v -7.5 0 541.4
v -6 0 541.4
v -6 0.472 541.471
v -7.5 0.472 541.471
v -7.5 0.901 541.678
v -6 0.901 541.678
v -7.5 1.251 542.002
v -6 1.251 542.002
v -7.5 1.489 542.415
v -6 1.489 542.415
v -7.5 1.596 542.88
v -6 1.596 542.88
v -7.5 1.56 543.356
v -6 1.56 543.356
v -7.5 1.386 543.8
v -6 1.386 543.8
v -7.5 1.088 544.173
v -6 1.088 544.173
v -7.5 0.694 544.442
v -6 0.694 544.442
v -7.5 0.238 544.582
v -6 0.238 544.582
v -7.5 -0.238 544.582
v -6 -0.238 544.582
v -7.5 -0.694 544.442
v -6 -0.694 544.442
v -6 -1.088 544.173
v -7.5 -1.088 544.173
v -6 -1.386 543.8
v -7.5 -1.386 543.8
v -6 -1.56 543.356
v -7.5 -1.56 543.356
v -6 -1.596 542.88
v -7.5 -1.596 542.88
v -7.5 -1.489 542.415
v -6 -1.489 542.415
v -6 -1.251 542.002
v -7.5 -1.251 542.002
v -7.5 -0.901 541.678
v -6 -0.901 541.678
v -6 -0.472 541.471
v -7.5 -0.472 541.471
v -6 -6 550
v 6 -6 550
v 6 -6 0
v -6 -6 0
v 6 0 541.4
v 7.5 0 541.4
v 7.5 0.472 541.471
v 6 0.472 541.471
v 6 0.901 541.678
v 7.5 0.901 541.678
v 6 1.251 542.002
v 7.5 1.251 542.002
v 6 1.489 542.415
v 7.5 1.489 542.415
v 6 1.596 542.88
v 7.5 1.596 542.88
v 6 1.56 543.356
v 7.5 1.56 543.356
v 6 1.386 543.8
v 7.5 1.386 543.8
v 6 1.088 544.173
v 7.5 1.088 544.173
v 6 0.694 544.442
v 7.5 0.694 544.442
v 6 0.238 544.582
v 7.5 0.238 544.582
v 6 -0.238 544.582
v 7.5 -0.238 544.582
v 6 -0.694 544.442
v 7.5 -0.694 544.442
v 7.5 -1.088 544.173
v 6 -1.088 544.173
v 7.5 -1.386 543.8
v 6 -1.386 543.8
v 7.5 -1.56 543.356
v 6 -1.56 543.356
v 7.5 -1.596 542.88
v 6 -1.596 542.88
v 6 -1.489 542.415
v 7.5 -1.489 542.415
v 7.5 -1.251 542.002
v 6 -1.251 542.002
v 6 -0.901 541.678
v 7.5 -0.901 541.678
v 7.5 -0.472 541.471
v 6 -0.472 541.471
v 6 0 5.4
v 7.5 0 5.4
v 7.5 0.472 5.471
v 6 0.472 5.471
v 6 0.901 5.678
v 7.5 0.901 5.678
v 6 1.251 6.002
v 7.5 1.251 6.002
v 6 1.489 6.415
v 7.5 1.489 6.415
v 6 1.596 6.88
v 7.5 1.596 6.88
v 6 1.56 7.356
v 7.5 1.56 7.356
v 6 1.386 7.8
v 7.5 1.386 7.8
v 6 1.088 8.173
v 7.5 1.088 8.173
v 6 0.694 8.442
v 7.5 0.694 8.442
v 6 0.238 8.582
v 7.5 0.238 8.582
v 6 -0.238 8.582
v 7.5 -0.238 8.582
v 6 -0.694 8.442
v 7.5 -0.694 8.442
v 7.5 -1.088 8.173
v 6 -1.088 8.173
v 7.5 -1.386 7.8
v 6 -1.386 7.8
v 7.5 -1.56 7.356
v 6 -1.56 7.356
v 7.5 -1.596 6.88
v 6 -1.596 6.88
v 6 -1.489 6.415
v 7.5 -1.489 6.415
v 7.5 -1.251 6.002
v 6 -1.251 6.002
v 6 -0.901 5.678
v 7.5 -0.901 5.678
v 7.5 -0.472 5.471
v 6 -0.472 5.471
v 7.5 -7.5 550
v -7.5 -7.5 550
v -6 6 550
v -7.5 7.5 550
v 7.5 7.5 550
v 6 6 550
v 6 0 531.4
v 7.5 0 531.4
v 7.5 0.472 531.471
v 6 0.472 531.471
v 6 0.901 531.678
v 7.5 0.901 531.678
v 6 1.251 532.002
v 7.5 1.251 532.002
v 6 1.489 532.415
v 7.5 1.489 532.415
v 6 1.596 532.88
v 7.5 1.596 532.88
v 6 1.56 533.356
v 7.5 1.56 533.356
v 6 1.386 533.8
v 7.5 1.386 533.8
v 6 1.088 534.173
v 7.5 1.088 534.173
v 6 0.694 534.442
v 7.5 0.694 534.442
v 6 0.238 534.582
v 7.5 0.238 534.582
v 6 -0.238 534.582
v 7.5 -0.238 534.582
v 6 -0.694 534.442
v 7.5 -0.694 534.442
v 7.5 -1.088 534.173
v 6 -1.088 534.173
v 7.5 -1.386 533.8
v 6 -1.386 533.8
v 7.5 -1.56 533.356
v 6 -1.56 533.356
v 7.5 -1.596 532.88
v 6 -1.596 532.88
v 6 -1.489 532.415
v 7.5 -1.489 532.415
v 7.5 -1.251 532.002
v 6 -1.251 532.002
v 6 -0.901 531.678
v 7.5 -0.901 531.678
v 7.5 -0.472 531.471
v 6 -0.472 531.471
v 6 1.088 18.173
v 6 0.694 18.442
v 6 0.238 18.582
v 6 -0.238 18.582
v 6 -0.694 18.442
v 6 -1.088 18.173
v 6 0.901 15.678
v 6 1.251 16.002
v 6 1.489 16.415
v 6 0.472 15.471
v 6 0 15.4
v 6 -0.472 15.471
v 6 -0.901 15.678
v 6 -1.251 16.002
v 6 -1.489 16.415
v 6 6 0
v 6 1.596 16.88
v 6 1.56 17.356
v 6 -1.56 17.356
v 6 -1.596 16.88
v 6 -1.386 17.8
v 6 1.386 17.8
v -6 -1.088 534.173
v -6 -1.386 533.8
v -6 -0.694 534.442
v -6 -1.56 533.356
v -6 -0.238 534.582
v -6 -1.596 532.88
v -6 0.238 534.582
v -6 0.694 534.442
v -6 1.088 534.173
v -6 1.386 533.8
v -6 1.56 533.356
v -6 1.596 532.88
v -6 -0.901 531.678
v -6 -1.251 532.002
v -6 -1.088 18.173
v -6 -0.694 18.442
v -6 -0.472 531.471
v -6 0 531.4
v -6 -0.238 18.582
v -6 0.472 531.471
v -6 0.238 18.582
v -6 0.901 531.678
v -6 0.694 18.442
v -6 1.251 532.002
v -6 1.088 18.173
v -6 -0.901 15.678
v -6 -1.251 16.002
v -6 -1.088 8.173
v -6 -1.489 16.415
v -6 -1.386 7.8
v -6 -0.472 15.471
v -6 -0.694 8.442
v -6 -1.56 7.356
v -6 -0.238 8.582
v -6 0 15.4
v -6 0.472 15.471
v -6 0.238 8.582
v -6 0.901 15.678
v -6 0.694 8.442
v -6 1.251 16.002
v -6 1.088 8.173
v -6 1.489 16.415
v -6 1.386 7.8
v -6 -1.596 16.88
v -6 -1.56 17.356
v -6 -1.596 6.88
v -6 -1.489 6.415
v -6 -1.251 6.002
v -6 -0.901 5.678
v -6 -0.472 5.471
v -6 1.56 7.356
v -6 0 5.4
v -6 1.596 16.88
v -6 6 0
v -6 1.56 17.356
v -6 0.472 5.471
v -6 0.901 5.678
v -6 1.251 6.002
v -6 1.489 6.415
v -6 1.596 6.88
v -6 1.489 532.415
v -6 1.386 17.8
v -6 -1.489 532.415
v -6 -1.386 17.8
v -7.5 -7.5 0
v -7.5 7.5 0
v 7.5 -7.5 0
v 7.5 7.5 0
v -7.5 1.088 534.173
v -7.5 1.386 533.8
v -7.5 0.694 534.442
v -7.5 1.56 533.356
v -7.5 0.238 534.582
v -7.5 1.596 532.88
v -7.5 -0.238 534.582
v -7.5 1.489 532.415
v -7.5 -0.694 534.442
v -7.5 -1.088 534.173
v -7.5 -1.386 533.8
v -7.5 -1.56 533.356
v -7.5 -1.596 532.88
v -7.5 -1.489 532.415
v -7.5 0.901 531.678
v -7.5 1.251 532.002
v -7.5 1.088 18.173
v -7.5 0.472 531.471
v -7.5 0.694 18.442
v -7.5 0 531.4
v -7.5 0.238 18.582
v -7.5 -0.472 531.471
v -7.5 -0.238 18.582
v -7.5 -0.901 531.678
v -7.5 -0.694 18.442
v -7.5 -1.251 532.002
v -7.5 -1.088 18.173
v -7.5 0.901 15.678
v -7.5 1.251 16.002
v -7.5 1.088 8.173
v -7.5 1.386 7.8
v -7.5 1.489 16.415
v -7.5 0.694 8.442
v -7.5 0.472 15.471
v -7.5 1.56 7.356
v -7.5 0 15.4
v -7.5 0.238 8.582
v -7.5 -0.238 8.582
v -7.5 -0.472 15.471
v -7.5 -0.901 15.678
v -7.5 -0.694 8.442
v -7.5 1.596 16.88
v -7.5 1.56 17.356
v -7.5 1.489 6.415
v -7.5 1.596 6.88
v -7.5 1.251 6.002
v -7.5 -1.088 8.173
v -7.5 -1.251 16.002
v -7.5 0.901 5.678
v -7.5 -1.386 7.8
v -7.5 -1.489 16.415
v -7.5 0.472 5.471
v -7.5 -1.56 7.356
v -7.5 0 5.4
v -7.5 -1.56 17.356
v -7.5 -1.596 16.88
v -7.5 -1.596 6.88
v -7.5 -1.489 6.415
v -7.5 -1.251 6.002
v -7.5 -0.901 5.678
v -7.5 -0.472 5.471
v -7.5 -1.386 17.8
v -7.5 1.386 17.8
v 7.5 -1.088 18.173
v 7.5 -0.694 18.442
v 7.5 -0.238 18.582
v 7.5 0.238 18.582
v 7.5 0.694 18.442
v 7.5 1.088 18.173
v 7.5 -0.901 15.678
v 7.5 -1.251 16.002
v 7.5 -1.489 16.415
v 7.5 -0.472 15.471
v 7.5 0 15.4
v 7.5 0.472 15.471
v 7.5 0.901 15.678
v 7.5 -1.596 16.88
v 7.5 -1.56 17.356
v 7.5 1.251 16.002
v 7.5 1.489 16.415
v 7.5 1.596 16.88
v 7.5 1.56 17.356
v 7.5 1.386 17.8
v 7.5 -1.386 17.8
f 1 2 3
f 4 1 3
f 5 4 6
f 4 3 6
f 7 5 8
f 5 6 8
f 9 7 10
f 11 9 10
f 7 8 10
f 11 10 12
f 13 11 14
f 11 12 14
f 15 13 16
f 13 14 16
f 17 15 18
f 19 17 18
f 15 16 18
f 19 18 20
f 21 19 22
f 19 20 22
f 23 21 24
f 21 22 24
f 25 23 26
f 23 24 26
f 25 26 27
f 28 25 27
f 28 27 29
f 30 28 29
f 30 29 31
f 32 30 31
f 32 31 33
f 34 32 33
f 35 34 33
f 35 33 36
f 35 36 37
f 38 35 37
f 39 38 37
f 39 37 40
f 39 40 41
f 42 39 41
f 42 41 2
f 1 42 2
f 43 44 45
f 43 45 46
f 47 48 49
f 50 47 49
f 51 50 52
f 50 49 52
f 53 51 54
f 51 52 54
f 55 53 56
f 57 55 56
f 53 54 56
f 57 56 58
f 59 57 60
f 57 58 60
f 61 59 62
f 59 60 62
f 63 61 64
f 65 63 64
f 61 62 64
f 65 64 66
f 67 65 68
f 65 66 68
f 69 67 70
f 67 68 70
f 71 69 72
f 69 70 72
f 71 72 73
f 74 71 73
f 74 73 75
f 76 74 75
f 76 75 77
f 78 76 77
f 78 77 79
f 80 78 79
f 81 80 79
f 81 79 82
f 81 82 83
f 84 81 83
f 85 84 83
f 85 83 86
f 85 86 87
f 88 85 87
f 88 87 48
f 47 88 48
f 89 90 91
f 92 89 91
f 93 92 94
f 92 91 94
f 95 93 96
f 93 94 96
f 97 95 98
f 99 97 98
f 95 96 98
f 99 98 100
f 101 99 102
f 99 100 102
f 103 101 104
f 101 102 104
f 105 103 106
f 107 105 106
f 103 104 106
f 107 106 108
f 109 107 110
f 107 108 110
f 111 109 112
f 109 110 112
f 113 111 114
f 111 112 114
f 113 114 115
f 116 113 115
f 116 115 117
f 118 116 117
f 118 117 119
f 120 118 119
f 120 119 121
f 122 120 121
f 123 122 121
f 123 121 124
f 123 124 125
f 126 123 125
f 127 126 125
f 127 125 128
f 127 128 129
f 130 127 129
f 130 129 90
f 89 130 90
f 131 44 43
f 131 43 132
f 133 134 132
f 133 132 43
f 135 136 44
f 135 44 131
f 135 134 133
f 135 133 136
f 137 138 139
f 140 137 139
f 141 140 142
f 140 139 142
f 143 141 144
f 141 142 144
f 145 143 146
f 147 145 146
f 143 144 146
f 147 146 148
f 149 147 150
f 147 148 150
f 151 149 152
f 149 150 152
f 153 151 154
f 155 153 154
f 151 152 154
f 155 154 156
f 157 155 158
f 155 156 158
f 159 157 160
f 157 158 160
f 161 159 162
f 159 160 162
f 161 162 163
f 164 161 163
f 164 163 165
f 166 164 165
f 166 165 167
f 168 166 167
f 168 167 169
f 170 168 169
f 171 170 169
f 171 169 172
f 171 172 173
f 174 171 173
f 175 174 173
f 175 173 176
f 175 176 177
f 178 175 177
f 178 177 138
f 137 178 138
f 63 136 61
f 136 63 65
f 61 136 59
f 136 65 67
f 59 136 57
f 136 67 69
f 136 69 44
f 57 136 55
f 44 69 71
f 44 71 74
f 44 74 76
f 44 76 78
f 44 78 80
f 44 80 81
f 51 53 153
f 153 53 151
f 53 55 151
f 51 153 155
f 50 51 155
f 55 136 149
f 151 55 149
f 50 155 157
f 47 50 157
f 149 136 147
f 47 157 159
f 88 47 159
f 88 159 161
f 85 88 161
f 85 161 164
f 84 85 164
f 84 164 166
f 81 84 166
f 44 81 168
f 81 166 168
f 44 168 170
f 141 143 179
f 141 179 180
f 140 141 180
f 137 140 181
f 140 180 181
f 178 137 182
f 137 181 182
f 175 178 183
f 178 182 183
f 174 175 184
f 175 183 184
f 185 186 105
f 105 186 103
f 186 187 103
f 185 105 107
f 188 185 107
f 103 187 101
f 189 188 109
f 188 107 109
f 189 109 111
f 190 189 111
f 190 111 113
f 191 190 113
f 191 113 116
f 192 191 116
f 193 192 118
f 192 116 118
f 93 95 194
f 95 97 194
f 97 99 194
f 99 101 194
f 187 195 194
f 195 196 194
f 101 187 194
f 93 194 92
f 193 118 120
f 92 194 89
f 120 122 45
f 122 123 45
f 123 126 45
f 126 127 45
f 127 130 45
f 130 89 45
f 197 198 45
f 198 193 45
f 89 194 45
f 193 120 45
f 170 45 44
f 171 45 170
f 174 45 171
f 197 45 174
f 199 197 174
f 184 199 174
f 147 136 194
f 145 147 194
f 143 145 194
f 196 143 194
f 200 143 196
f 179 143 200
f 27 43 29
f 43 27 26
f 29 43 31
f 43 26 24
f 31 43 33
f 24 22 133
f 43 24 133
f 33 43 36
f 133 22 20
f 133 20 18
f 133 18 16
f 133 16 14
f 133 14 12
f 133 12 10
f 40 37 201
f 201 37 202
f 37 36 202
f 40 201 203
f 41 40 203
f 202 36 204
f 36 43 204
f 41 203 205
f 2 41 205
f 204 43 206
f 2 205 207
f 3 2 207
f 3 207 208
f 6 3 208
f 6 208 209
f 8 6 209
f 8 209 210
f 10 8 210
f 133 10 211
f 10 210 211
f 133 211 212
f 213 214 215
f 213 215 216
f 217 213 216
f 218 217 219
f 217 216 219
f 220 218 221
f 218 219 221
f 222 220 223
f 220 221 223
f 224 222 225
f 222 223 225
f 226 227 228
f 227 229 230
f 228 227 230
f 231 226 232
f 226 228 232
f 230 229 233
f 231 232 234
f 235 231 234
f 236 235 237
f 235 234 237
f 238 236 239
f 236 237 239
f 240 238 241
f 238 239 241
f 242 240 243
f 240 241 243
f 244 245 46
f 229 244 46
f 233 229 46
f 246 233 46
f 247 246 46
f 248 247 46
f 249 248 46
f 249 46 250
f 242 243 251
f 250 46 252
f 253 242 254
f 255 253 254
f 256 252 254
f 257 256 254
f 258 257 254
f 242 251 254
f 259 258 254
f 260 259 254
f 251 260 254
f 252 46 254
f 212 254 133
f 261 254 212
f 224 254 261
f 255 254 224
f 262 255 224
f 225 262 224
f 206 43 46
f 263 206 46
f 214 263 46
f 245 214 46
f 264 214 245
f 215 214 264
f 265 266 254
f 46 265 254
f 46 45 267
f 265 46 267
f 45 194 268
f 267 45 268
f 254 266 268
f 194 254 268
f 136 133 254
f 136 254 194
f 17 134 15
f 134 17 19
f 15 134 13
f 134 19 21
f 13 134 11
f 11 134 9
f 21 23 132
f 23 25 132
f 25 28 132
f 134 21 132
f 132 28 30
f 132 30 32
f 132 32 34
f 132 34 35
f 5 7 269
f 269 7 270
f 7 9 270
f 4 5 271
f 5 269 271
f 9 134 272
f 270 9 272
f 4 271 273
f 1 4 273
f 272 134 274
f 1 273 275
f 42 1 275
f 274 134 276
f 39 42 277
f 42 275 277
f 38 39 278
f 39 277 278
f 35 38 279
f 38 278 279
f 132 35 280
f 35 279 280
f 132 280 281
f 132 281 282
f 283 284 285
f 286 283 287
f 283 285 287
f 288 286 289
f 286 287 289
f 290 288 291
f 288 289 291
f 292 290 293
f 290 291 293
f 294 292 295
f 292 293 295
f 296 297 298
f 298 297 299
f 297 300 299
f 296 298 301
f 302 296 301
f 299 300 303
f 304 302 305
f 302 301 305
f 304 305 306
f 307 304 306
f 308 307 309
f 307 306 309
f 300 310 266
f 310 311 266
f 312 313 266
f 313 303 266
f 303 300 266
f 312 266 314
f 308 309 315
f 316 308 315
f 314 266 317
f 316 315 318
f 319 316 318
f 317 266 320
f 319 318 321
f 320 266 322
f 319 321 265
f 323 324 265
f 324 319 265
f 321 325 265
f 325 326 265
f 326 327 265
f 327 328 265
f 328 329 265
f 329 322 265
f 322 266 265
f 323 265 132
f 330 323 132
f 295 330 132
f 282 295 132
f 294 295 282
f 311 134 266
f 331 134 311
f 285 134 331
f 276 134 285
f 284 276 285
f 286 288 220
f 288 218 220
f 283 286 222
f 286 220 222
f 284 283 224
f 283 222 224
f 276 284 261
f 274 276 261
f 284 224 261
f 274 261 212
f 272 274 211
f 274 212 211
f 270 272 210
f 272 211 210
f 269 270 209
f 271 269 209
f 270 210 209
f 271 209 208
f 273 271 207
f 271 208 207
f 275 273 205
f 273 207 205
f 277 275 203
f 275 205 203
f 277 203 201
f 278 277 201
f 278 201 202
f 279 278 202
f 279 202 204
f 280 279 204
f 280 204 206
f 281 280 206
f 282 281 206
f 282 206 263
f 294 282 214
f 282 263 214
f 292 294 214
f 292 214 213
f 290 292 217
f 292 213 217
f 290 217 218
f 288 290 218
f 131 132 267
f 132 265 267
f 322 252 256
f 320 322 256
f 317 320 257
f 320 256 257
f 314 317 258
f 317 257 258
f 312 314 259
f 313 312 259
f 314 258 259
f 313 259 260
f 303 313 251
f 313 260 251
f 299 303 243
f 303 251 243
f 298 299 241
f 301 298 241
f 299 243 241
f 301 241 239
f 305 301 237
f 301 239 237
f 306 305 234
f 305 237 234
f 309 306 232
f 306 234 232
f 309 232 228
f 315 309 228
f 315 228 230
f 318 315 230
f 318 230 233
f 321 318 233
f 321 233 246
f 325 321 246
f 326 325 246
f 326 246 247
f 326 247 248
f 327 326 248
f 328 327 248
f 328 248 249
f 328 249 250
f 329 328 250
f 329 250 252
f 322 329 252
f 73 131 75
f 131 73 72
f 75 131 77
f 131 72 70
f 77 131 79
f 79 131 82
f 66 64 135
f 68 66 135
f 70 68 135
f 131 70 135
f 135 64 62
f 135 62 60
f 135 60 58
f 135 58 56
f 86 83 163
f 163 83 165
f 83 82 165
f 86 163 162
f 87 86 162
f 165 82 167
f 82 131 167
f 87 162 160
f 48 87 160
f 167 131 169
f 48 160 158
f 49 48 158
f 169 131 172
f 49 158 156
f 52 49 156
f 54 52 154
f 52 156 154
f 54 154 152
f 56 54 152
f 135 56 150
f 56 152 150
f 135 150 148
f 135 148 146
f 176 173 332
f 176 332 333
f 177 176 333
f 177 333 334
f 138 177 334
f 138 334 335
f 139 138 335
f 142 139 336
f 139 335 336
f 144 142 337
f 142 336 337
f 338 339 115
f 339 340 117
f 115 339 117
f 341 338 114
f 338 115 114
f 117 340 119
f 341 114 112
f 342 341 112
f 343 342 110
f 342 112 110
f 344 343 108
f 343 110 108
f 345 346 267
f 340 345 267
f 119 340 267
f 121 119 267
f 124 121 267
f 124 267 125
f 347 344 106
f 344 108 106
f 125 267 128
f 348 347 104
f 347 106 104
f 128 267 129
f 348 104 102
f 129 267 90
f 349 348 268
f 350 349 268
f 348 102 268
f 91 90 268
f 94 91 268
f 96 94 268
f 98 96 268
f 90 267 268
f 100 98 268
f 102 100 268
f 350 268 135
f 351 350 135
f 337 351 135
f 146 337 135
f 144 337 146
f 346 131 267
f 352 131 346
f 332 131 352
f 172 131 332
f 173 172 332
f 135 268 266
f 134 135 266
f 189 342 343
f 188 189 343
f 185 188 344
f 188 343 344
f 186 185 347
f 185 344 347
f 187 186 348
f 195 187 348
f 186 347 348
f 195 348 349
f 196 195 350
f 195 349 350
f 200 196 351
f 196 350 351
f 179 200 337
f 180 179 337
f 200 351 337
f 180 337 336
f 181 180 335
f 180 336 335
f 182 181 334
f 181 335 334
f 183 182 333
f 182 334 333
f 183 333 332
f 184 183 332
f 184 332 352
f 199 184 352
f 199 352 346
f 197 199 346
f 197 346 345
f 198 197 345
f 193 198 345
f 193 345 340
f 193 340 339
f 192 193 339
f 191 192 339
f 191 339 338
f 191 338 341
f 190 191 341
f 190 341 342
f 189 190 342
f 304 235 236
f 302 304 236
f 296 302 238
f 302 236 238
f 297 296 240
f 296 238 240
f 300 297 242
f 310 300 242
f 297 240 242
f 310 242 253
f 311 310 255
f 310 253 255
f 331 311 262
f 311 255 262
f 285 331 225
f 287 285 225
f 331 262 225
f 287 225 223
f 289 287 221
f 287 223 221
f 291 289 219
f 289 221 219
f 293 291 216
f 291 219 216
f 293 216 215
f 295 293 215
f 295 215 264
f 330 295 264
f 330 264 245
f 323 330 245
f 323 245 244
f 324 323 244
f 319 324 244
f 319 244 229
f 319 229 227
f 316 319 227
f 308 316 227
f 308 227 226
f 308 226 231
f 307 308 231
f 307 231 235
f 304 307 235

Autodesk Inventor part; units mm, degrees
ref_plane "YZ Plane" through (0, 0, 0) normal (1, 0, 0) x (0, 1, 0)
ref_plane "XZ Plane" through (0, 0, 0) normal (0, 1, 0) x (-1, 0, 0)
ref_plane "XY Plane" through (0, 0, 0) normal (0, 0, 1) x (1, 0, 0)
sketch "スケッチ1" plane through (0, 0, 0) normal (0, 0, 1) x (1, 0, 0)
  line L0 (7.5, 7.5) -> (-7.5, 7.5)
  line L1 (-7.5, 7.5) -> (-7.5, -7.5)
  line L2 (-7.5, -7.5) -> (7.5, -7.5)
  line L3 (7.5, -7.5) -> (7.5, 7.5)
  line L4 (7.5, 7.5) -> (-7.5, -7.5) construction
  line L5 (-7.5, 7.5) -> (7.5, -7.5) construction
  line L6 (-6, 6) -> (6, 6)
  line L7 (6, 6) -> (6, -6)
  line L8 (6, -6) -> (-6, -6)
  line L9 (-6, -6) -> (-6, 6)
  point P0 (0, 0)
  dimension "d0" = 15
  dimension "d1" = 15
  dimension "d2" = 1.5
extrude "押し出し1" add sketch "スケッチ1" along normal blind 550
sketch "スケッチ2" plane through (7.5, -7.5, 0) normal (1, 0, 0) x (0, 0, -1)
  circle A0 centre (-7, 7.5) radius 1.6
  circle A1 centre (-17, 7.5) radius 1.6
  line L0 (0, 0) -> (0, 15) projected
  circle A2 centre (-533, 7.5) radius 1.6
  circle A3 centre (-543, 7.5) radius 1.6
  line L1 (-550, 0) -> (-550, 15) projected
  point P0 (0, 7.5)
  point P1 (0, 7.5)
  dimension "d5" = 3.2
  dimension "d6" = 3.2
  dimension "d7" = 7
  dimension "d8" = 10
  dimension "d9" = 3.2
  dimension "d10" = 3.2
  dimension "d11" = 10
  dimension "d12" = 7
extrude "押し出し2" cut sketch "スケッチ2" against normal through all
properties part number "上昇機構_角柱4" material "アルミニウム 6061"
